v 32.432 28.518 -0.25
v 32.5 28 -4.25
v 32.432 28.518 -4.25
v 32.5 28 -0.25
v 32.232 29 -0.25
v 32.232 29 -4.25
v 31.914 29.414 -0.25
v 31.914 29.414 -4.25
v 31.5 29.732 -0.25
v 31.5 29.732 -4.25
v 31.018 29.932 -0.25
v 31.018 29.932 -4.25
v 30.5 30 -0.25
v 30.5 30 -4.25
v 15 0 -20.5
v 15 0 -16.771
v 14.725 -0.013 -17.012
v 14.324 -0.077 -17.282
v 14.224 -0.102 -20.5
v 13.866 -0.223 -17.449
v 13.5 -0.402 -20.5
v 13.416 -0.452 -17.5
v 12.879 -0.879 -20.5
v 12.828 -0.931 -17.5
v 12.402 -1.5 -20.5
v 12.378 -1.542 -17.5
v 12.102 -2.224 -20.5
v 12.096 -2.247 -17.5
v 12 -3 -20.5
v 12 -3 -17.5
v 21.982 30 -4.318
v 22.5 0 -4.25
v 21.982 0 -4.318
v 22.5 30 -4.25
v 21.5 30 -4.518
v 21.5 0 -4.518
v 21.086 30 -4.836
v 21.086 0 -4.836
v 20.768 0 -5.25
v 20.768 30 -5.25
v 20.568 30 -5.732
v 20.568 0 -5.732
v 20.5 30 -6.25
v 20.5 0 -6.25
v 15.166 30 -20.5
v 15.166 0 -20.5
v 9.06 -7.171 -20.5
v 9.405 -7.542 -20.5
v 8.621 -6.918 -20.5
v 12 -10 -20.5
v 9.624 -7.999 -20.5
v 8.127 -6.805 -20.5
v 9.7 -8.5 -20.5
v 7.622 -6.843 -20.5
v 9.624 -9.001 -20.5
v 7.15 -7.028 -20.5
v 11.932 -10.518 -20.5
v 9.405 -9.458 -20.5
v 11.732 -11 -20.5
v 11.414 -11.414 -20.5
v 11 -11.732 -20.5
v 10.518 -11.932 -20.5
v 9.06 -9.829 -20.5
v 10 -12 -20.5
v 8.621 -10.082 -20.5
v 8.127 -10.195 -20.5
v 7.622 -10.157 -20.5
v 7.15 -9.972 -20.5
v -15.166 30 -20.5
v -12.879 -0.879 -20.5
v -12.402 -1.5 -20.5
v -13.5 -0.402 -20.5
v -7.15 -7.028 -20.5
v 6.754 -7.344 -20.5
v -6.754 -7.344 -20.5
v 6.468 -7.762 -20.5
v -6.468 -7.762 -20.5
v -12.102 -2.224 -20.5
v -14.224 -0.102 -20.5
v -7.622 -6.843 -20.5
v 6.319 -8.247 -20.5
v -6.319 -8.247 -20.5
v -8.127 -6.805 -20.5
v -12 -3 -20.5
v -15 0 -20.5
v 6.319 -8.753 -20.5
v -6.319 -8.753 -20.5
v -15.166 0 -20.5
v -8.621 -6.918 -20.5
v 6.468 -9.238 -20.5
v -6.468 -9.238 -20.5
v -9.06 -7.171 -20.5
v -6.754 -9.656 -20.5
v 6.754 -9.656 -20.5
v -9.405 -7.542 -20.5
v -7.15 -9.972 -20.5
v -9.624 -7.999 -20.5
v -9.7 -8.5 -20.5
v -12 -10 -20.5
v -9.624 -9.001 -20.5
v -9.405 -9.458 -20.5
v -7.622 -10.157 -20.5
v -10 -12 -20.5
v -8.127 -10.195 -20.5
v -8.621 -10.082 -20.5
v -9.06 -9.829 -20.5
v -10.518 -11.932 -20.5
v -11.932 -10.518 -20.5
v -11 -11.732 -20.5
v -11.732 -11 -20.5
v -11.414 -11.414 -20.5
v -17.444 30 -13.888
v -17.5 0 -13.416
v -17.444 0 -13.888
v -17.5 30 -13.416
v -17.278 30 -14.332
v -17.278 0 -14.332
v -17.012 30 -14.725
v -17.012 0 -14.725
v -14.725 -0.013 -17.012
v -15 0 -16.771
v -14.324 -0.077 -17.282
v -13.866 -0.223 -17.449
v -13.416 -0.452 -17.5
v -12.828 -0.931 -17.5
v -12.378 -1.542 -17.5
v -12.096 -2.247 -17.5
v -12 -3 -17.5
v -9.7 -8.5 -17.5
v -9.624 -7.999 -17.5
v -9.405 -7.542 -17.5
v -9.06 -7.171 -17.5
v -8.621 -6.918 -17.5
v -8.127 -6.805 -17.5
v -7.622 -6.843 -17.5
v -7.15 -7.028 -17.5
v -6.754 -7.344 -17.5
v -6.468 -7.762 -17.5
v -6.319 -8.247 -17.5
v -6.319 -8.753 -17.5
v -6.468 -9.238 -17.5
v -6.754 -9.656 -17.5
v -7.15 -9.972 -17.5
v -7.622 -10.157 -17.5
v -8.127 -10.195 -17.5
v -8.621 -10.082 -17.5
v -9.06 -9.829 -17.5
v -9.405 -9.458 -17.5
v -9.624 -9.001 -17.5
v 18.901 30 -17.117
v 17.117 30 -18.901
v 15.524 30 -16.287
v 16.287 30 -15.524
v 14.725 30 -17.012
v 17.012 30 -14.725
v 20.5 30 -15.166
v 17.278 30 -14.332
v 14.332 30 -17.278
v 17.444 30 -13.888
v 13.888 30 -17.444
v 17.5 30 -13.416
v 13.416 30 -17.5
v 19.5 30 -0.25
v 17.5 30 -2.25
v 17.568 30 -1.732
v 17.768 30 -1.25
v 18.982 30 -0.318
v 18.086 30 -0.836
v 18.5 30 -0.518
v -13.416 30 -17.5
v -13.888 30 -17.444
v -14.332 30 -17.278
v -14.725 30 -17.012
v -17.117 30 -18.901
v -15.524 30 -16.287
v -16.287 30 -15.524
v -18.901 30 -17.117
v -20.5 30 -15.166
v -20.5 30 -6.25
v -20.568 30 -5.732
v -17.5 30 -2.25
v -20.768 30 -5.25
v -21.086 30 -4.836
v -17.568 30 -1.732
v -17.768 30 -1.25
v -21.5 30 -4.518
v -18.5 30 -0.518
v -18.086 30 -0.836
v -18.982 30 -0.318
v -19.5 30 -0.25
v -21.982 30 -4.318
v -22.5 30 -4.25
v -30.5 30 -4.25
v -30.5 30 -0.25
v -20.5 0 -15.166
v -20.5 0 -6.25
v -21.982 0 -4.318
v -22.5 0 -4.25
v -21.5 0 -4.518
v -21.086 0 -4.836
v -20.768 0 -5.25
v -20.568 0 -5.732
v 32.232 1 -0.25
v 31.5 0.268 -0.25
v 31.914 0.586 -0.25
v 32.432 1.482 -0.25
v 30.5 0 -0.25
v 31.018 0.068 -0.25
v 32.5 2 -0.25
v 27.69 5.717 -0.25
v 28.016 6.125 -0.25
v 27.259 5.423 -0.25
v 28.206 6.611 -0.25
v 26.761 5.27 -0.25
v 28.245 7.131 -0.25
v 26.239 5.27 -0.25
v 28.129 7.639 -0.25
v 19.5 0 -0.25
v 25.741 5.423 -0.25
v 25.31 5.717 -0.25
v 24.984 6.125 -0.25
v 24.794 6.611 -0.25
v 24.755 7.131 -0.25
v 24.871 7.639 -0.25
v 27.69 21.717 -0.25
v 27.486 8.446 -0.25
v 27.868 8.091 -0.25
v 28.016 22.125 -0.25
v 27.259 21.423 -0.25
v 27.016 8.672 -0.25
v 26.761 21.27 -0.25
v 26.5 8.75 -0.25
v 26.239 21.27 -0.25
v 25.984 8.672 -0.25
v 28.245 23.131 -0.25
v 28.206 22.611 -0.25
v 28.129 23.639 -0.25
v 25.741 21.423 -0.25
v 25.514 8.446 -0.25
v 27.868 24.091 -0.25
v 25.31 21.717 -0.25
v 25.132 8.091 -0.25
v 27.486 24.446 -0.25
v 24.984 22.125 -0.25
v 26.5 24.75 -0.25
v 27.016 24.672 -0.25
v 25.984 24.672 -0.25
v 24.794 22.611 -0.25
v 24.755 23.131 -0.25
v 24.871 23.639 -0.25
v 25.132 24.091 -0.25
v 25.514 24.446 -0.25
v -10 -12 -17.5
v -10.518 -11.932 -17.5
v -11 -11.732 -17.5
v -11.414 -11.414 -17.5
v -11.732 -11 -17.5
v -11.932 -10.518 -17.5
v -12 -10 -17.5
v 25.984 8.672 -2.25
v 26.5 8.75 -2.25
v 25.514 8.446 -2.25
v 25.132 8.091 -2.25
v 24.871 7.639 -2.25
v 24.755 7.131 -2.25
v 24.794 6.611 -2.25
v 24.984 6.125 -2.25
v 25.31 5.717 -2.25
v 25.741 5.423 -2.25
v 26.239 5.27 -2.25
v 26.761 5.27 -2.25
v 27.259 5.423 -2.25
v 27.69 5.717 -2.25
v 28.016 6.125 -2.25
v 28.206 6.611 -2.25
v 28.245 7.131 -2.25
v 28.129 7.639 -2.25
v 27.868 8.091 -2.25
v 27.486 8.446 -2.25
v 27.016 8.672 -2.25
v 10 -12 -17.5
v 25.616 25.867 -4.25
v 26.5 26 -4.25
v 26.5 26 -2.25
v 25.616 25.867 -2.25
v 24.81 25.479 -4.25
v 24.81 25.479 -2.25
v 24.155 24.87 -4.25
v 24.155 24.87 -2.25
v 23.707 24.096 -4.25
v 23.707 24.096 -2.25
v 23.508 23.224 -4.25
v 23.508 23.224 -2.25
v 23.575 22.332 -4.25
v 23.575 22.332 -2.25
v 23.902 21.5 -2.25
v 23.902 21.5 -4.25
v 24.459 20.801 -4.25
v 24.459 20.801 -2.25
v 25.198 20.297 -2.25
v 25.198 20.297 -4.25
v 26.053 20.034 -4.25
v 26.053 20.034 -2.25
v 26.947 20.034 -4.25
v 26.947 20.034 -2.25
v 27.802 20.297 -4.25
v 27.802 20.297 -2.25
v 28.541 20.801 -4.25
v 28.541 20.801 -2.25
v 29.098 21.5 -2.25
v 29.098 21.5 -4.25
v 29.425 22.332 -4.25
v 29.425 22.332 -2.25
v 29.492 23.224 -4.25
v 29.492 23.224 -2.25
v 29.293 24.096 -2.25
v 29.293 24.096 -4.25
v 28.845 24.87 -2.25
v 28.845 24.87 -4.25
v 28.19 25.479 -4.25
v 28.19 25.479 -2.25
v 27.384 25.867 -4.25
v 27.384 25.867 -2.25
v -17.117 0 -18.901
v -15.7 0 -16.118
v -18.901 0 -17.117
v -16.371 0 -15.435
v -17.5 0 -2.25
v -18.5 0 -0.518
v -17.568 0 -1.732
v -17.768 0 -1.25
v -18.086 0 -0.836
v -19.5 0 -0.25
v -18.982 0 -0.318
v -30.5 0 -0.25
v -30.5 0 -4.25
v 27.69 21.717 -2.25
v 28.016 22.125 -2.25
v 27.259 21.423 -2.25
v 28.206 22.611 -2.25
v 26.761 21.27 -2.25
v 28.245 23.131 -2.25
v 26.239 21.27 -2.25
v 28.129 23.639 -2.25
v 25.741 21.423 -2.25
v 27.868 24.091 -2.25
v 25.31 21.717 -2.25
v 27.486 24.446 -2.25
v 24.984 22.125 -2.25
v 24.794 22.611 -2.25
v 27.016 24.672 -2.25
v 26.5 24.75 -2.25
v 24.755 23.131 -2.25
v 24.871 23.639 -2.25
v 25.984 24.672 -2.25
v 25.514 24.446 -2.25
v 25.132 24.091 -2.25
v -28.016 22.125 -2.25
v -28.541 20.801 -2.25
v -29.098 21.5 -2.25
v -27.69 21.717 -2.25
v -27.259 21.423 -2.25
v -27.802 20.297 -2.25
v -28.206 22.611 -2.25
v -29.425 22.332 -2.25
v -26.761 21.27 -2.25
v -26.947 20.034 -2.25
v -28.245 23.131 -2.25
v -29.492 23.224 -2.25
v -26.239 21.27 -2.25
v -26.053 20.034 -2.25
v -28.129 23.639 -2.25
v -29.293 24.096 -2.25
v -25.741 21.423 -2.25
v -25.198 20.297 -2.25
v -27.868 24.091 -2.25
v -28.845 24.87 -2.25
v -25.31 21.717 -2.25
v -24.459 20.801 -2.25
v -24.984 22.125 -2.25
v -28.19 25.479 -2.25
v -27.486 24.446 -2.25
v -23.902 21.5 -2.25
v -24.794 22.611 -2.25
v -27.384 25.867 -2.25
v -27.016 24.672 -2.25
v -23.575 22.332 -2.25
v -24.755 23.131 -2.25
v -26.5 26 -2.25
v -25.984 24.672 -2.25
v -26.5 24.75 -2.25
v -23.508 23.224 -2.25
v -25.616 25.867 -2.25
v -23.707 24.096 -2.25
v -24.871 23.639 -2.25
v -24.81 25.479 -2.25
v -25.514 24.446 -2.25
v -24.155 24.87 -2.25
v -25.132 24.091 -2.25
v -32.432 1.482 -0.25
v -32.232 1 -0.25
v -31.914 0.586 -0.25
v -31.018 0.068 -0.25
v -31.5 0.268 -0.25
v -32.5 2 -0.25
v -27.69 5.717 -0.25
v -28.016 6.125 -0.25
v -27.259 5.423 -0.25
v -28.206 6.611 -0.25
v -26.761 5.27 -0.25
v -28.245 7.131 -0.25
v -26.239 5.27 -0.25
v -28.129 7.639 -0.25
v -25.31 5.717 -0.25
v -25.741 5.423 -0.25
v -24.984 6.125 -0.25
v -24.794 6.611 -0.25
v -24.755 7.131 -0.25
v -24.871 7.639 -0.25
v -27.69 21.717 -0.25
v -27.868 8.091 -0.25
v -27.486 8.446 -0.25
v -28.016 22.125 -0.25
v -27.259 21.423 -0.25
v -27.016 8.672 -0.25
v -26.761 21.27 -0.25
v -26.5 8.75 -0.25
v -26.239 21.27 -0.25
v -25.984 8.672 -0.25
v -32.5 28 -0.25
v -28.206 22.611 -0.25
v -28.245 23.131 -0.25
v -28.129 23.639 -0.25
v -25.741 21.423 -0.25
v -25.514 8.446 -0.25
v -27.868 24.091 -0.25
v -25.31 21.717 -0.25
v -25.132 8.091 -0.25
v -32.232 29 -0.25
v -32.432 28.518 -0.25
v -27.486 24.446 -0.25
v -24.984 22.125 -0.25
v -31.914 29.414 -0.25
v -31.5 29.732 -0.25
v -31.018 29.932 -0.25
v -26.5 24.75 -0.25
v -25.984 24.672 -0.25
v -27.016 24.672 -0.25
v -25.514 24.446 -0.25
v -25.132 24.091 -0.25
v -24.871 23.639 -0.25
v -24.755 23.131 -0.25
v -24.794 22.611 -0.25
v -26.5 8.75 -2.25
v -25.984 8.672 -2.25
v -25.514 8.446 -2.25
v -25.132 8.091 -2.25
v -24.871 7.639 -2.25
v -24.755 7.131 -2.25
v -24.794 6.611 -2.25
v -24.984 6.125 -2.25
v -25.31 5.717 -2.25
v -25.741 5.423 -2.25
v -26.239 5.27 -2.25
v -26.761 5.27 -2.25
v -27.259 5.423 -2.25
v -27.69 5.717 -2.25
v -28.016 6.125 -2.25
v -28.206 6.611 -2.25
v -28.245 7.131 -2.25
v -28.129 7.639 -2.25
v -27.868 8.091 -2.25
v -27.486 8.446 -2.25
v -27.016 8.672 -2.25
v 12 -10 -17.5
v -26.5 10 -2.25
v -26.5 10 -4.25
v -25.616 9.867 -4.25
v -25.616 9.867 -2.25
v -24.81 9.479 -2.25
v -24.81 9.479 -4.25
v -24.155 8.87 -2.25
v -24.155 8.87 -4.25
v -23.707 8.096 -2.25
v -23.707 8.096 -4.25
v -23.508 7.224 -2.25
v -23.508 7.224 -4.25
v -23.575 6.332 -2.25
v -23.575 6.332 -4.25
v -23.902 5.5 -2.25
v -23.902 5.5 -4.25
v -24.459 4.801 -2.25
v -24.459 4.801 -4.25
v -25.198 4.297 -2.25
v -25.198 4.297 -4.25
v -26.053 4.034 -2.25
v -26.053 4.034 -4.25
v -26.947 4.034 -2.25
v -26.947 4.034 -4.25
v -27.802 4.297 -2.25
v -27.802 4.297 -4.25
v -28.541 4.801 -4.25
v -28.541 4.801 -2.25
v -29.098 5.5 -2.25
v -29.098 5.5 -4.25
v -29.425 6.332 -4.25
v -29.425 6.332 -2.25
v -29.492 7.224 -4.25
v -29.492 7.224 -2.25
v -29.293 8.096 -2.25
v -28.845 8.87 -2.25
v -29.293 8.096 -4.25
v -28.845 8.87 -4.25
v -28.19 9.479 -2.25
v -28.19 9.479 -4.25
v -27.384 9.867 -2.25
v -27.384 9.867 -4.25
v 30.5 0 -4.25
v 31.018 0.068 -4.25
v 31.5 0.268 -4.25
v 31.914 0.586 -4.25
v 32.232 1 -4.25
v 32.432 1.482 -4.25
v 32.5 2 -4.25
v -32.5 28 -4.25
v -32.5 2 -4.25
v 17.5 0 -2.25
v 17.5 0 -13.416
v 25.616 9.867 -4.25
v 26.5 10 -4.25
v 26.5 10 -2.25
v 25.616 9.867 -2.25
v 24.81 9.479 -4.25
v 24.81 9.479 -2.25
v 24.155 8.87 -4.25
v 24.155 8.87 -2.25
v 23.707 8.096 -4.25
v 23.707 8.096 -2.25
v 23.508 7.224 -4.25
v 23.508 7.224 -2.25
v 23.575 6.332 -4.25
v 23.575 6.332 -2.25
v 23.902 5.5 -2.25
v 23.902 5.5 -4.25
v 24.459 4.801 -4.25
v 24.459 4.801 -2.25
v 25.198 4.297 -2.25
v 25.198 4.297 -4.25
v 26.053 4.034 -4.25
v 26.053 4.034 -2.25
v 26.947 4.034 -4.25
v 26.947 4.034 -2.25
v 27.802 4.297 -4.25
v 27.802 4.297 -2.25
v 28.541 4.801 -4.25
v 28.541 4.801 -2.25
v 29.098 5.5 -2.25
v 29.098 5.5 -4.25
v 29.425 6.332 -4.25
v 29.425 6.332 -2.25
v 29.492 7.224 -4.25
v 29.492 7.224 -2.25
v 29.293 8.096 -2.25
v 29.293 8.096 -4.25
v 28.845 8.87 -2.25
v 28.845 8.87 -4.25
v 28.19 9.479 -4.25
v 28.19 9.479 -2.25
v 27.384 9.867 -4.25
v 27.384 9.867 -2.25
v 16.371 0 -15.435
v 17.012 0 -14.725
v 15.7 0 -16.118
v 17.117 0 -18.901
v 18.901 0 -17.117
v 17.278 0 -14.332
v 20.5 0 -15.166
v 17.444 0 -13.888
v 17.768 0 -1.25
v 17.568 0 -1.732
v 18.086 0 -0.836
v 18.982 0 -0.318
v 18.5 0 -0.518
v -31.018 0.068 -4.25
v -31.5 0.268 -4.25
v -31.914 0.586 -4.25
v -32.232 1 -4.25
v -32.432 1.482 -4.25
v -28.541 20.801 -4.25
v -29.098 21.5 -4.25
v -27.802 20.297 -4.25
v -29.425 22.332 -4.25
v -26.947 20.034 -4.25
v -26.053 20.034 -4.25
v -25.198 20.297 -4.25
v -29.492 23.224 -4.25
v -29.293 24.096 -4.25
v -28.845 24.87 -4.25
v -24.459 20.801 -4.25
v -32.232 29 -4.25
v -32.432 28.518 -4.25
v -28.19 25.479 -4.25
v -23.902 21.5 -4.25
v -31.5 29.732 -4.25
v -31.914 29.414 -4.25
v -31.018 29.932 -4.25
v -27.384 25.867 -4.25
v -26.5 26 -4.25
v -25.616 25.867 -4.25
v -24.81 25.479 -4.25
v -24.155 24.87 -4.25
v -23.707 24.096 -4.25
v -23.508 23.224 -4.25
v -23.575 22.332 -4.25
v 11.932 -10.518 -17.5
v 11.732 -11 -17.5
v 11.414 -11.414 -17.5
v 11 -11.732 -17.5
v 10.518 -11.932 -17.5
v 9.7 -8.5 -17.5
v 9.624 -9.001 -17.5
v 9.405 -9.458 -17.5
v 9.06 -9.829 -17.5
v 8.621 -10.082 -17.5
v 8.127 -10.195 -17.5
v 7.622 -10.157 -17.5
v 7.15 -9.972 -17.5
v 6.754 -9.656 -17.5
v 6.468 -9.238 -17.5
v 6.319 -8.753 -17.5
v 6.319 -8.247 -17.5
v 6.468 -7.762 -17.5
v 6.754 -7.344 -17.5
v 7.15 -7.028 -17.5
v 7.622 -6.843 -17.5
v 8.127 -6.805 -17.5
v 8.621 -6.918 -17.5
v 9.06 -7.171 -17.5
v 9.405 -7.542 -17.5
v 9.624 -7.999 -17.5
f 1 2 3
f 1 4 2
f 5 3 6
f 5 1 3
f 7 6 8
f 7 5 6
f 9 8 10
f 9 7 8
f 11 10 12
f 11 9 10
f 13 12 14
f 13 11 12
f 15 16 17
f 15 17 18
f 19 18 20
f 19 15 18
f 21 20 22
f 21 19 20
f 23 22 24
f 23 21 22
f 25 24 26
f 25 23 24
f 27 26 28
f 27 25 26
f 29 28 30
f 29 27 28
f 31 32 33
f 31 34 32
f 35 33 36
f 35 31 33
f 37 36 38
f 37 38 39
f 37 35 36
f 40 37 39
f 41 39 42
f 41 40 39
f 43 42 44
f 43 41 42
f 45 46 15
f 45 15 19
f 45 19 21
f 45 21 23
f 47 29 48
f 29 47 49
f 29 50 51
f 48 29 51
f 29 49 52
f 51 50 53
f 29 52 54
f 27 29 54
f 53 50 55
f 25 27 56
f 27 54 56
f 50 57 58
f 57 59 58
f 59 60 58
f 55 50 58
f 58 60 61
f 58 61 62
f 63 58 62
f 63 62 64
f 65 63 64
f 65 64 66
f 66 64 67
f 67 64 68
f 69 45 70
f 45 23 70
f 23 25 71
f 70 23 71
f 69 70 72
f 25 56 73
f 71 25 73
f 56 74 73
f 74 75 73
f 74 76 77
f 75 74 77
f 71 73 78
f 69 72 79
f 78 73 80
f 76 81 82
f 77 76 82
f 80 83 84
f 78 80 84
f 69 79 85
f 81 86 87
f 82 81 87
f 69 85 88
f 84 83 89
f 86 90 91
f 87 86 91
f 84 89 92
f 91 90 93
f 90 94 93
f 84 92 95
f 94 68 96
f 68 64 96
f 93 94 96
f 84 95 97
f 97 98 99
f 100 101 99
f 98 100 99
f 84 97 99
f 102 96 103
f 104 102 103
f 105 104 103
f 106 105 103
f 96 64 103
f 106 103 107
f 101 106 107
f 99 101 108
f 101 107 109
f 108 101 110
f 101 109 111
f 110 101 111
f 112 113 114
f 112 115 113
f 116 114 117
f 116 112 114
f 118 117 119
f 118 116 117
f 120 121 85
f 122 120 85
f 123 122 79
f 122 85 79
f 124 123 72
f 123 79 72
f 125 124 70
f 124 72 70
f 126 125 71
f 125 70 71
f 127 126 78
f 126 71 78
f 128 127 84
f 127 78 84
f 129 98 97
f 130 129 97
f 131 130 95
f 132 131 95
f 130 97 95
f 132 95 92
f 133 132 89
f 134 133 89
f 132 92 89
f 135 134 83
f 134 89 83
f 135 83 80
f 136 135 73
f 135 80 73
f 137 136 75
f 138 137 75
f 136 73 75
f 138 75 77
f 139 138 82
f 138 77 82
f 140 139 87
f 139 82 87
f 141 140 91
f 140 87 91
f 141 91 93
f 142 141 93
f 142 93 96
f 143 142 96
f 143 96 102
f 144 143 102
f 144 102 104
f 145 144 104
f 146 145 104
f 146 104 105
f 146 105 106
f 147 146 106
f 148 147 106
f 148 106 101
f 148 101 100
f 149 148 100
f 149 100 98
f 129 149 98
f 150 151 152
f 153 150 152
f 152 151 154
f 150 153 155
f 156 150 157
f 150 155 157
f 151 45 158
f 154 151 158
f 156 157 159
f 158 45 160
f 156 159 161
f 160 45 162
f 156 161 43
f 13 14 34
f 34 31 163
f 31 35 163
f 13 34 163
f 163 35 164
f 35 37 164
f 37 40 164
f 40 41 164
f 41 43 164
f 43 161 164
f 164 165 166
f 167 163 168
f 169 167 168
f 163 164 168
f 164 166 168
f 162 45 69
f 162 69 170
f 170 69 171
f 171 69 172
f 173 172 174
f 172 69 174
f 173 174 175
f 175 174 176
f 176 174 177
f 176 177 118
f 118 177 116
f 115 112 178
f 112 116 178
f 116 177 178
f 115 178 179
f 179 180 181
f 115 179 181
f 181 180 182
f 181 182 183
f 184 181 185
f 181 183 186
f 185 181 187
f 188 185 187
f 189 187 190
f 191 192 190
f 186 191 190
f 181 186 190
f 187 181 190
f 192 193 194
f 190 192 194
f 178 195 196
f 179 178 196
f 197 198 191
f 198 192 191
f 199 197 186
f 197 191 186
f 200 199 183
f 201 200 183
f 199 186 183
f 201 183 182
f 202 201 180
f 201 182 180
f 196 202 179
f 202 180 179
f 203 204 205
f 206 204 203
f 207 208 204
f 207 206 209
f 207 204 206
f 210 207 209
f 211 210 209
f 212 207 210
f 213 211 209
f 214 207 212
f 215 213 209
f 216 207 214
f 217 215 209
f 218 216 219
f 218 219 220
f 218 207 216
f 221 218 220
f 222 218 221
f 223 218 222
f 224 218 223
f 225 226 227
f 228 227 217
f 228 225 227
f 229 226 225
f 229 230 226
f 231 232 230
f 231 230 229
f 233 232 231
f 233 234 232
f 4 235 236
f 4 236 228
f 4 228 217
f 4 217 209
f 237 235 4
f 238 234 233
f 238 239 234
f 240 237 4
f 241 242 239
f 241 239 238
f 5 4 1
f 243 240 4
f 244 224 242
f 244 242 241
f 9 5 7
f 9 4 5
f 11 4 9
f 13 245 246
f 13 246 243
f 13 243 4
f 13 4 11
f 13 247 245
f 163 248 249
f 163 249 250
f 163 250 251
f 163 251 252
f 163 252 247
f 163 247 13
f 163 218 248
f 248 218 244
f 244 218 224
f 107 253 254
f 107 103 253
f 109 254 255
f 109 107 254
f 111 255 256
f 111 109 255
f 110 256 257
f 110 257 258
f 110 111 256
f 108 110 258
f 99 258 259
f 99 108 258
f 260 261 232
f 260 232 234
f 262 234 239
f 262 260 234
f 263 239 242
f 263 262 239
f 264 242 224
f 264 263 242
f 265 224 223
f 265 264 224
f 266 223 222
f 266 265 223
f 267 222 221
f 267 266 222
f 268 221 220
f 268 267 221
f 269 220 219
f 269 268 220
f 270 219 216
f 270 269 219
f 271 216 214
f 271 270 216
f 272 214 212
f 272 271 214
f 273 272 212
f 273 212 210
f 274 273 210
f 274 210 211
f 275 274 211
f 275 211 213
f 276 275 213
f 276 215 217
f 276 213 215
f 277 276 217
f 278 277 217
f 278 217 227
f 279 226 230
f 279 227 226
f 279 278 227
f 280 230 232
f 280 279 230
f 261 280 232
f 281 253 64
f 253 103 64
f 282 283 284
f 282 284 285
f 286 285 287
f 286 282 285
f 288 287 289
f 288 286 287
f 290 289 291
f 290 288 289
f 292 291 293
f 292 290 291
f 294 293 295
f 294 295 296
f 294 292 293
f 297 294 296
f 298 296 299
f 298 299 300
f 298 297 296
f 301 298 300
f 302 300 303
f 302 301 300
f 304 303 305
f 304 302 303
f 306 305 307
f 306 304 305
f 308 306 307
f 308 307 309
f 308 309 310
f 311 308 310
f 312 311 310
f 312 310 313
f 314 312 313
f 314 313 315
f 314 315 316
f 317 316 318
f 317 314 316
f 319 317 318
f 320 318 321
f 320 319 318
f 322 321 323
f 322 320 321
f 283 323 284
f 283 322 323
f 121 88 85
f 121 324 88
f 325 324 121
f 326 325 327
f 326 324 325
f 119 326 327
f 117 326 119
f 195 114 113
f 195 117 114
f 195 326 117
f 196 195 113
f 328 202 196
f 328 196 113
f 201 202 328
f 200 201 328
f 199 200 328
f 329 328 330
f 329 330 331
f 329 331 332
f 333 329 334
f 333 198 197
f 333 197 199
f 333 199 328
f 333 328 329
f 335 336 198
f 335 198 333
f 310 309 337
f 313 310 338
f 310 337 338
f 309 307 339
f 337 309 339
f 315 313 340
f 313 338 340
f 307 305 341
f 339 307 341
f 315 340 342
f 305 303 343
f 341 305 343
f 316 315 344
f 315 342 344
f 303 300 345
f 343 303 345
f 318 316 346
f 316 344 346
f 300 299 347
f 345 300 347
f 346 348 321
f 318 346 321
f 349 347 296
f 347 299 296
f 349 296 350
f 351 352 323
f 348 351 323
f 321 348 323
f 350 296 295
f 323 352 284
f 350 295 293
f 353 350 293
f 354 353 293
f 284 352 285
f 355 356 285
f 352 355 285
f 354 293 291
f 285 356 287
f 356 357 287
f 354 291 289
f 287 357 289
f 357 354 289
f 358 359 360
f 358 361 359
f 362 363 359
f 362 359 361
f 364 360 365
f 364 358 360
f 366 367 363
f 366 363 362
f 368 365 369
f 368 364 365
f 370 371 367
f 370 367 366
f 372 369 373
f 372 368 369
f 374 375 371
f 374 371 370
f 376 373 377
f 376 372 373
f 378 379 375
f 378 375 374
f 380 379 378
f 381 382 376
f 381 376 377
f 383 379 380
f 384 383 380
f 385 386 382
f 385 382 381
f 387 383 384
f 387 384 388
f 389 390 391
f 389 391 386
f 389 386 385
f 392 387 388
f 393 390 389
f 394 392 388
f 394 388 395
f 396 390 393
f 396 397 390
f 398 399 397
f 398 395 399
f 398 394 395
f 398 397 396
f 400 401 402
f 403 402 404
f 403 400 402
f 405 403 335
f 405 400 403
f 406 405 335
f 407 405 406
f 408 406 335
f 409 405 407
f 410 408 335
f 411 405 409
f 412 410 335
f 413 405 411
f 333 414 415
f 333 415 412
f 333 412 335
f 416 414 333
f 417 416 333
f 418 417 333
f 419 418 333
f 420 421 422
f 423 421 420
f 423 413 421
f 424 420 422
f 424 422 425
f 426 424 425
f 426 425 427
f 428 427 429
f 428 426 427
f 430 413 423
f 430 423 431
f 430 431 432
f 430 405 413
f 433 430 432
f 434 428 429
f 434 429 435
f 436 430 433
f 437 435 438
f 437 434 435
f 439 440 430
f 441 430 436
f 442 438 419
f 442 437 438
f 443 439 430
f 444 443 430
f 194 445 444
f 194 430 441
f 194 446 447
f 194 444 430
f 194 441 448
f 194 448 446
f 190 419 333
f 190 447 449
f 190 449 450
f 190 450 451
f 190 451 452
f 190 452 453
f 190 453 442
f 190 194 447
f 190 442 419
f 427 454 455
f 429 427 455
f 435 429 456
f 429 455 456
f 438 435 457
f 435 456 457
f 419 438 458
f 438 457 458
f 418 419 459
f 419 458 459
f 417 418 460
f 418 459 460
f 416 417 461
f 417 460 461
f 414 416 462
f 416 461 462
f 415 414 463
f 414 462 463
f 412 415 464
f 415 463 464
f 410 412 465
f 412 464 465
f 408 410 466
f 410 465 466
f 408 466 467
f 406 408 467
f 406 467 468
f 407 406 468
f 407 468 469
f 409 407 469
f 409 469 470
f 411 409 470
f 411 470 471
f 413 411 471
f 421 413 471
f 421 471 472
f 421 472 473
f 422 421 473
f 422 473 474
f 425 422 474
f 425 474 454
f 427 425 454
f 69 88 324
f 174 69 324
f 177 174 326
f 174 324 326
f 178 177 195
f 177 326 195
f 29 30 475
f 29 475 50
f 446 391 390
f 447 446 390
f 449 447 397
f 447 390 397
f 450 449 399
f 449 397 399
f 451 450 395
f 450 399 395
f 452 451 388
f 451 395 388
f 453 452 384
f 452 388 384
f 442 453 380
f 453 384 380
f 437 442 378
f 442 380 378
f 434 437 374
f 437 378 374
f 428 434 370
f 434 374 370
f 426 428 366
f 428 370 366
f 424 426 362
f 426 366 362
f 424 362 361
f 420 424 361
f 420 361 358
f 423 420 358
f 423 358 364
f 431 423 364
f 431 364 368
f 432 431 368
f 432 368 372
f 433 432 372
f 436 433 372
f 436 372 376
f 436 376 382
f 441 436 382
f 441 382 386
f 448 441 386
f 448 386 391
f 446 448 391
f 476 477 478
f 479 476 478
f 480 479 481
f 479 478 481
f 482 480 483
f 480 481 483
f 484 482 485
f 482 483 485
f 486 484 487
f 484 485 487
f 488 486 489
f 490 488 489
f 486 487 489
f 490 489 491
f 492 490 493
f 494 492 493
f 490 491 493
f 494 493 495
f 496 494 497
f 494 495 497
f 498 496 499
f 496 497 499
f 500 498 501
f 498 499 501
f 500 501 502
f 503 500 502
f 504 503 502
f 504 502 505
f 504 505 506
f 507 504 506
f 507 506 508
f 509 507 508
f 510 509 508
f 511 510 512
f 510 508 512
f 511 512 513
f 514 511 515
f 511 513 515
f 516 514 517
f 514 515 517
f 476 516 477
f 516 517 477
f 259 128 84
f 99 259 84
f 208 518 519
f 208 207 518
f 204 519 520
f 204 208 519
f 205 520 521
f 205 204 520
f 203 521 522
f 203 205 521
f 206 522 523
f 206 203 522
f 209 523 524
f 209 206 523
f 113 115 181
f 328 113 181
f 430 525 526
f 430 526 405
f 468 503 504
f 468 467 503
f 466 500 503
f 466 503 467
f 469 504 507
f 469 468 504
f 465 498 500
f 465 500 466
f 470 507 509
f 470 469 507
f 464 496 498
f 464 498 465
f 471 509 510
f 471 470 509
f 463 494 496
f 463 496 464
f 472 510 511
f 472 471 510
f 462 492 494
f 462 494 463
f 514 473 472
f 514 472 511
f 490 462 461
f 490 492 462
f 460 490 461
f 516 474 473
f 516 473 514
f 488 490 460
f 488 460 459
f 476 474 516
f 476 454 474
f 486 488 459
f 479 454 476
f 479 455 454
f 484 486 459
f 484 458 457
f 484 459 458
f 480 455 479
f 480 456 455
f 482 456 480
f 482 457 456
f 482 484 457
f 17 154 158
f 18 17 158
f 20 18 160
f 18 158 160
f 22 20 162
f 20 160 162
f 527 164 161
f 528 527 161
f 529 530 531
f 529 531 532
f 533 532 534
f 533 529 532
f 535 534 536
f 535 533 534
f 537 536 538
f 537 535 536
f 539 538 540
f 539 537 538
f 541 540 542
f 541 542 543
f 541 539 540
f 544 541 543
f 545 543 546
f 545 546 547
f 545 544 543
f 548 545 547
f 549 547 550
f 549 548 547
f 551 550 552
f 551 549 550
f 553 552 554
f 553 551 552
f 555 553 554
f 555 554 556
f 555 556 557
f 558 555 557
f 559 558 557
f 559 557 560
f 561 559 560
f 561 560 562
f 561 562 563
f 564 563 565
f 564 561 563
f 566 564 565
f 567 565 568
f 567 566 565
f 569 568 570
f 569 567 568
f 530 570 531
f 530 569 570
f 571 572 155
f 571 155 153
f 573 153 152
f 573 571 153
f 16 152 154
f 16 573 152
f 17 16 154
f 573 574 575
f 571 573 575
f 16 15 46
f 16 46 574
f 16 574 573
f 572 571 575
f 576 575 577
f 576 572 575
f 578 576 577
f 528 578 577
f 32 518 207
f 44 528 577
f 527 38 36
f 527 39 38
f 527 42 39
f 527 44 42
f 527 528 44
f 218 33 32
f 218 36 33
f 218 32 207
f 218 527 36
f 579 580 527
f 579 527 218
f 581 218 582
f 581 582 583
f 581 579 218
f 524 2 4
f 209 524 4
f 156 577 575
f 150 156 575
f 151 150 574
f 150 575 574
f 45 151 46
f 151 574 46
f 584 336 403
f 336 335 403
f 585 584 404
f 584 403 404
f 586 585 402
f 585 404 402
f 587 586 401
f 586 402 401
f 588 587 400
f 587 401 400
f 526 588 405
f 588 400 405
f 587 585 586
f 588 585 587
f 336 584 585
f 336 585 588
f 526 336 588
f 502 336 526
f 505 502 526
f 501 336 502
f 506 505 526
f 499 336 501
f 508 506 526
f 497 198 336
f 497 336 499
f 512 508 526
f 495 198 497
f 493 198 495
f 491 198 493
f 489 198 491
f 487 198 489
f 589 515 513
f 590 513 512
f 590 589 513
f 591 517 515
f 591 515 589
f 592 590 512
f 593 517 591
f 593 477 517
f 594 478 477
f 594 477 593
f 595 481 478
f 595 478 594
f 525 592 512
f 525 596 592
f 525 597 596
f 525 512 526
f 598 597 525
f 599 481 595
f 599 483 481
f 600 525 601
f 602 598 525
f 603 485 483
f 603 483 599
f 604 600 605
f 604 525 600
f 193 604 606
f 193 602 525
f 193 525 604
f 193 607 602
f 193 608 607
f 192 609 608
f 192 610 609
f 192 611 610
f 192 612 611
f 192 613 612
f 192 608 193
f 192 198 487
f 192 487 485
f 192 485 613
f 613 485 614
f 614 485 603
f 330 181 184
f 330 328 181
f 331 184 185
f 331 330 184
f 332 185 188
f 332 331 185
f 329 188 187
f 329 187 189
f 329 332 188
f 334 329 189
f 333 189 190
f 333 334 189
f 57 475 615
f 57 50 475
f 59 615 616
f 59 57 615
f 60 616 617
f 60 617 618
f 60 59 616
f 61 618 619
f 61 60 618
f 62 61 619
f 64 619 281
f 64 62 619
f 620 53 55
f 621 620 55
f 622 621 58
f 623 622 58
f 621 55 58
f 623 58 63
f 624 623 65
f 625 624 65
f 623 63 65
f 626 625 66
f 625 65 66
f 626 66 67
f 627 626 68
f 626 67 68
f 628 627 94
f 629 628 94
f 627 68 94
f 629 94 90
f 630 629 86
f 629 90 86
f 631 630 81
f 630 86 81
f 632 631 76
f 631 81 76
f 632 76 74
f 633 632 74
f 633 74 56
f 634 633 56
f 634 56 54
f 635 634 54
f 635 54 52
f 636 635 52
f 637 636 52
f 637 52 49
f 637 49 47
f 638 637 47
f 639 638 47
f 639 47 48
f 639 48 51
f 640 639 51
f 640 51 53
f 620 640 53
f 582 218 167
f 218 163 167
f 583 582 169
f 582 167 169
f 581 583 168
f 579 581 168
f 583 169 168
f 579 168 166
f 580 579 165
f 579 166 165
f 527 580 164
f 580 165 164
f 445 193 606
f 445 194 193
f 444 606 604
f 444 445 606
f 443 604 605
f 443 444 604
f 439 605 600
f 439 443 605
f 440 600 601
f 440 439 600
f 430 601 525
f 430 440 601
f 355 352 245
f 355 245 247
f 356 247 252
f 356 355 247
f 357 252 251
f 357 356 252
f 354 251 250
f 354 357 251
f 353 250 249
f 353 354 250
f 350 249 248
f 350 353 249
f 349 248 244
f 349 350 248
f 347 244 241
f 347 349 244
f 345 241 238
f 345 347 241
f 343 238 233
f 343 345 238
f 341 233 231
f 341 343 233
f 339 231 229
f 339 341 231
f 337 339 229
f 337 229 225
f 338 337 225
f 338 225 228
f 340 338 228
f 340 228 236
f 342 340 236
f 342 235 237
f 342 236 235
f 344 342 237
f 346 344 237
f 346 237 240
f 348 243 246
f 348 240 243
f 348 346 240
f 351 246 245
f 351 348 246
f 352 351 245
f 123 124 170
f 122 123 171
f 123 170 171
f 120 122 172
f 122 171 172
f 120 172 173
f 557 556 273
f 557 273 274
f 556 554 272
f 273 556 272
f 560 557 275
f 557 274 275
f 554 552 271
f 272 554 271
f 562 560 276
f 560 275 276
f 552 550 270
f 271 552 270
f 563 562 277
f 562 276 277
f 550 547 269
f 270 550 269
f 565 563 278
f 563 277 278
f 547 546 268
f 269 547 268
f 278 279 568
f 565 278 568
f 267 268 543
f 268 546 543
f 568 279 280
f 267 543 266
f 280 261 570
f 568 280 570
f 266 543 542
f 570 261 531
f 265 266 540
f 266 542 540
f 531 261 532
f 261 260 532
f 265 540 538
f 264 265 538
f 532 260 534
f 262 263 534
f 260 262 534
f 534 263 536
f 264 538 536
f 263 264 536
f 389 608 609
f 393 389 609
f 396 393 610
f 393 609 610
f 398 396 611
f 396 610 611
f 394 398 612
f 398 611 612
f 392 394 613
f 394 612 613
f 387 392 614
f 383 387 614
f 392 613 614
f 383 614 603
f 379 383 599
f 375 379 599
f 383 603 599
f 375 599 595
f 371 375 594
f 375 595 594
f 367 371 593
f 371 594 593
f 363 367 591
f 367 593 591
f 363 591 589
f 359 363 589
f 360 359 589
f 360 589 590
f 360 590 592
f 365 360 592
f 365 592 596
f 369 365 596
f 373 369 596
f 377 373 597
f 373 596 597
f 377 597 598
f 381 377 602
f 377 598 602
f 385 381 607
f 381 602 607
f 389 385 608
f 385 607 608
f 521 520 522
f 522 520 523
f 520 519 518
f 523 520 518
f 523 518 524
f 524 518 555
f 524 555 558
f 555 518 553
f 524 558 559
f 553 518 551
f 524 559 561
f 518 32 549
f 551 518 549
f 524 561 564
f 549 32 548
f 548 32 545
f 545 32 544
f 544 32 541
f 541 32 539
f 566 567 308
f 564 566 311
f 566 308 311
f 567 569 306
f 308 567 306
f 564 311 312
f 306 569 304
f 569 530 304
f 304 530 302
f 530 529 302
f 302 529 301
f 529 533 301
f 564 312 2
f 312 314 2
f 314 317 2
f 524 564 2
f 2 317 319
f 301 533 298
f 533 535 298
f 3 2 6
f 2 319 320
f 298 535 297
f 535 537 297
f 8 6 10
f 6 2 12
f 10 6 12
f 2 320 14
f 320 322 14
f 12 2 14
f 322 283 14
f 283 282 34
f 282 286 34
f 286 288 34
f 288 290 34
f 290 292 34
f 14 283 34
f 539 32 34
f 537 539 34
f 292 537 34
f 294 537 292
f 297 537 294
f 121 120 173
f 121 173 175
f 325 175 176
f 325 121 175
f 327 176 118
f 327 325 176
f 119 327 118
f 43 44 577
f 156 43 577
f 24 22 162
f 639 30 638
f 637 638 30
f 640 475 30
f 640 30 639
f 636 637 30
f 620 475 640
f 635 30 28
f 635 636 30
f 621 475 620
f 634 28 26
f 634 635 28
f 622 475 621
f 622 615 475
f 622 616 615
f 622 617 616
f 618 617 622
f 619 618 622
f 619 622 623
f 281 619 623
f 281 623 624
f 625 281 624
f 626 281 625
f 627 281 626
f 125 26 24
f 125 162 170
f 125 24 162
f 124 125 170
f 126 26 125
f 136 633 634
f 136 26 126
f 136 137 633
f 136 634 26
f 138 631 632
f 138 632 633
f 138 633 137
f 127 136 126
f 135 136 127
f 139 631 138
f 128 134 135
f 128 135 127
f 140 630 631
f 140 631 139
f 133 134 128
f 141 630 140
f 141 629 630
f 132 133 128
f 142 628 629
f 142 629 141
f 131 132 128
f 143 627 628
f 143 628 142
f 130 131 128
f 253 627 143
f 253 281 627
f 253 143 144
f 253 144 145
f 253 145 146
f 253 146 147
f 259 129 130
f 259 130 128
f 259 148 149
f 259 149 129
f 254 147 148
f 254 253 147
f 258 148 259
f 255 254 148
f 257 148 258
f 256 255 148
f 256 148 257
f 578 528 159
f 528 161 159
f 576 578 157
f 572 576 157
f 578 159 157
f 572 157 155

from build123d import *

# Parameters (mm, degrees)
EXTRUDE_1_DEPTH     = 30
FILLET_1_R          = 2
SKETCH_2_W          = 4
SKETCH_2_H          = 30
EXTRUDE_2_DEPTH     = 12
SKETCH_3_W          = 79.384571865
SKETCH_3_H          = 60.739492306
CUT_EXTRUDE_1_DEPTH = 30
SKETCH_4_R          = 1.75
CUT_EXTRUDE_2_DEPTH = 30
SKETCH_5_R          = 3
CUT_EXTRUDE_3_DEPTH = 2
FILLET_2_R          = 2
SKETCH_6_W          = 24
SKETCH_6_H          = 3
EXTRUDE_4_DEPTH     = 12
SKETCH_7_R          = 1.7
CUT_EXTRUDE_4_DEPTH = 12
FILLET_3_R          = 3
FILLET_4_R          = 2


with BuildPart() as part:
    # 草图1 → 凸台-拉伸1 (new body)
    with BuildSketch(Plane(origin=(0, 0, 0), x_dir=(1, 0, 0), z_dir=(0, 1, 0))):
        with BuildLine():
            Line((15.165750888, 20.5), (-15.165750888, 20.5))
            ThreePointArc((-15.165750888, 20.5), (-18.03122292, 18.03122292), (-20.5, 15.165750888))
            Line((-20.5, 15.165750888), (-20.5, -15.165750888))
            ThreePointArc((-20.5, -15.165750888), (-18.03122292, -18.03122292), (-15.165750888, -20.5))
            Line((-15.165750888, -20.5), (15.165750888, -20.5))
            ThreePointArc((15.165750888, -20.5), (18.03122292, -18.03122292), (20.5, -15.165750888))
            Line((20.5, -15.165750888), (20.5, 15.165750888))
            ThreePointArc((20.5, 15.165750888), (18.03122292, 18.03122292), (15.165750888, 20.5))
        make_face()
        with BuildLine():
            Line((-17.5, 14.142135624), (-17.5, -14.142135624))
            ThreePointArc((-17.5, -14.142135624), (-15.909902577, -15.909902577), (-14.142135624, -17.5))
            Line((-14.142135624, -17.5), (14.142135624, -17.5))
            ThreePointArc((14.142135624, -17.5), (15.909902577, -15.909902577), (17.5, -14.142135624))
            Line((17.5, -14.142135624), (17.5, 14.142135624))
            ThreePointArc((17.5, 14.142135624), (15.909902577, 15.909902577), (14.142135624, 17.5))
            Line((14.142135624, 17.5), (-14.142135624, 17.5))
            ThreePointArc((-14.142135624, 17.5), (-15.909902577, 15.909902577), (-17.5, 14.142135624))
        make_face(mode=Mode.SUBTRACT)
    extrude(amount=EXTRUDE_1_DEPTH)

    # 圆角1
    fillet_1_edges = [part.edges().sort_by_distance(p)[0] for p in [
        (-14.142135624, 15, -17.5),
        (-17.5, 15, -14.142135624),
        (-17.5, 15, 14.142135624),
        (-14.142135624, 15, 17.5),
        (14.142135624, 15, 17.5),
        (17.5, 15, 14.142135624),
        (17.5, 15, -14.142135624),
        (14.142135624, 15, -17.5),
    ]]
    fillet(fillet_1_edges, radius=FILLET_1_R)

    # 草图2 → 凸台-拉伸2 (add)
    with BuildSketch(Plane.ZY.offset(20.5)):
        with Locations((-2.25, 15)):
            Rectangle(SKETCH_2_W, SKETCH_2_H)
    extrude_2 = extrude(amount=EXTRUDE_2_DEPTH)

    # 草图3 → 切除-拉伸1 (cut)
    with BuildSketch(Plane.XY.offset(-0.25)):
        with Locations((-5.656839026, 19.40389916)):
            Rectangle(SKETCH_3_W, SKETCH_3_H)
    cut_extrude_1 = extrude(amount=CUT_EXTRUDE_1_DEPTH, mode=Mode.SUBTRACT)

    # 草图4 → 切除-拉伸2 (cut)
    with BuildSketch(Plane(origin=(0, 0, -4.25), x_dir=(-1, 0, 0), z_dir=(0, 0, -1))):
        with Locations(Location((26.5, 23, 0), (0, 0, 90))):
            Circle(SKETCH_4_R)
        with Locations(Location((26.5, 7, 0), (0, 0, 90))):
            Circle(SKETCH_4_R)
    cut_extrude_2 = extrude(amount=-CUT_EXTRUDE_2_DEPTH, mode=Mode.SUBTRACT)

    # 草图5 → 切除-拉伸3 (cut)
    with BuildSketch(Plane(origin=(0, 0, -4.25), x_dir=(-1, 0, 0), z_dir=(0, 0, -1))):
        with Locations(Location((26.5, 23, 0), (0, 0, 90))):
            Circle(SKETCH_5_R)
        with Locations(Location((26.5, 7, 0), (0, 0, 90))):
            Circle(SKETCH_5_R)
    cut_extrude_3 = extrude(amount=-CUT_EXTRUDE_3_DEPTH, mode=Mode.SUBTRACT)

    # 镜向1: 凸台-拉伸2, 切除-拉伸1, 切除-拉伸2, 切除-拉伸3 across plane
    add(extrude_2.mirror(Plane.ZY))
    add(cut_extrude_1.mirror(Plane.ZY), mode=Mode.SUBTRACT)
    add(cut_extrude_2.mirror(Plane.ZY), mode=Mode.SUBTRACT)
    add(cut_extrude_3.mirror(Plane.ZY), mode=Mode.SUBTRACT)

    # 圆角2
    fillet_2_edges = [part.edges().sort_by_distance(p)[0] for p in [
        (-20.5, 15, -4.25),
        (-32.5, 30, -2.25),
        (-32.5, 0, -2.25),
        (17.5, 15, -0.25),
        (-17.5, 15, -0.25),
        (32.5, 0, -2.25),
        (32.5, 30, -2.25),
        (20.5, 15, -4.25),
    ]]
    fillet(fillet_2_edges, radius=FILLET_2_R)

    # 草图6 → 凸台-拉伸4 (add)
    with BuildSketch(Plane(origin=(0, 0, 0), x_dir=(1, 0, 0), z_dir=(0, 1, 0))):
        with Locations((0, 19)):
            Rectangle(SKETCH_6_W, SKETCH_6_H)
    extrude(amount=-EXTRUDE_4_DEPTH)

    # 草图7 → 切除-拉伸4 (cut)
    with BuildSketch(Plane(origin=(0, 0, -20.5), x_dir=(-1, 0, 0), z_dir=(0, 0, -1))):
        with Locations((8, -8.5)):
            Circle(SKETCH_7_R)
        with Locations(Location((-8, -8.5, 0), (0, 0, 180))):
            Circle(SKETCH_7_R)
    extrude(amount=-CUT_EXTRUDE_4_DEPTH, mode=Mode.SUBTRACT)

    # 圆角3
    fillet_3_edges = [part.edges().sort_by_distance(p)[0] for p in [
        (-12, 0, -19),
        (12, 0, -19),
    ]]
    fillet(fillet_3_edges, radius=FILLET_3_R)

    # 圆角4
    fillet_4_edges = [part.edges().sort_by_distance(p)[0] for p in [
        (-12, -12, -19),
        (12, -12, -19),
    ]]
    fillet(fillet_4_edges, radius=FILLET_4_R)


solid = part.part
